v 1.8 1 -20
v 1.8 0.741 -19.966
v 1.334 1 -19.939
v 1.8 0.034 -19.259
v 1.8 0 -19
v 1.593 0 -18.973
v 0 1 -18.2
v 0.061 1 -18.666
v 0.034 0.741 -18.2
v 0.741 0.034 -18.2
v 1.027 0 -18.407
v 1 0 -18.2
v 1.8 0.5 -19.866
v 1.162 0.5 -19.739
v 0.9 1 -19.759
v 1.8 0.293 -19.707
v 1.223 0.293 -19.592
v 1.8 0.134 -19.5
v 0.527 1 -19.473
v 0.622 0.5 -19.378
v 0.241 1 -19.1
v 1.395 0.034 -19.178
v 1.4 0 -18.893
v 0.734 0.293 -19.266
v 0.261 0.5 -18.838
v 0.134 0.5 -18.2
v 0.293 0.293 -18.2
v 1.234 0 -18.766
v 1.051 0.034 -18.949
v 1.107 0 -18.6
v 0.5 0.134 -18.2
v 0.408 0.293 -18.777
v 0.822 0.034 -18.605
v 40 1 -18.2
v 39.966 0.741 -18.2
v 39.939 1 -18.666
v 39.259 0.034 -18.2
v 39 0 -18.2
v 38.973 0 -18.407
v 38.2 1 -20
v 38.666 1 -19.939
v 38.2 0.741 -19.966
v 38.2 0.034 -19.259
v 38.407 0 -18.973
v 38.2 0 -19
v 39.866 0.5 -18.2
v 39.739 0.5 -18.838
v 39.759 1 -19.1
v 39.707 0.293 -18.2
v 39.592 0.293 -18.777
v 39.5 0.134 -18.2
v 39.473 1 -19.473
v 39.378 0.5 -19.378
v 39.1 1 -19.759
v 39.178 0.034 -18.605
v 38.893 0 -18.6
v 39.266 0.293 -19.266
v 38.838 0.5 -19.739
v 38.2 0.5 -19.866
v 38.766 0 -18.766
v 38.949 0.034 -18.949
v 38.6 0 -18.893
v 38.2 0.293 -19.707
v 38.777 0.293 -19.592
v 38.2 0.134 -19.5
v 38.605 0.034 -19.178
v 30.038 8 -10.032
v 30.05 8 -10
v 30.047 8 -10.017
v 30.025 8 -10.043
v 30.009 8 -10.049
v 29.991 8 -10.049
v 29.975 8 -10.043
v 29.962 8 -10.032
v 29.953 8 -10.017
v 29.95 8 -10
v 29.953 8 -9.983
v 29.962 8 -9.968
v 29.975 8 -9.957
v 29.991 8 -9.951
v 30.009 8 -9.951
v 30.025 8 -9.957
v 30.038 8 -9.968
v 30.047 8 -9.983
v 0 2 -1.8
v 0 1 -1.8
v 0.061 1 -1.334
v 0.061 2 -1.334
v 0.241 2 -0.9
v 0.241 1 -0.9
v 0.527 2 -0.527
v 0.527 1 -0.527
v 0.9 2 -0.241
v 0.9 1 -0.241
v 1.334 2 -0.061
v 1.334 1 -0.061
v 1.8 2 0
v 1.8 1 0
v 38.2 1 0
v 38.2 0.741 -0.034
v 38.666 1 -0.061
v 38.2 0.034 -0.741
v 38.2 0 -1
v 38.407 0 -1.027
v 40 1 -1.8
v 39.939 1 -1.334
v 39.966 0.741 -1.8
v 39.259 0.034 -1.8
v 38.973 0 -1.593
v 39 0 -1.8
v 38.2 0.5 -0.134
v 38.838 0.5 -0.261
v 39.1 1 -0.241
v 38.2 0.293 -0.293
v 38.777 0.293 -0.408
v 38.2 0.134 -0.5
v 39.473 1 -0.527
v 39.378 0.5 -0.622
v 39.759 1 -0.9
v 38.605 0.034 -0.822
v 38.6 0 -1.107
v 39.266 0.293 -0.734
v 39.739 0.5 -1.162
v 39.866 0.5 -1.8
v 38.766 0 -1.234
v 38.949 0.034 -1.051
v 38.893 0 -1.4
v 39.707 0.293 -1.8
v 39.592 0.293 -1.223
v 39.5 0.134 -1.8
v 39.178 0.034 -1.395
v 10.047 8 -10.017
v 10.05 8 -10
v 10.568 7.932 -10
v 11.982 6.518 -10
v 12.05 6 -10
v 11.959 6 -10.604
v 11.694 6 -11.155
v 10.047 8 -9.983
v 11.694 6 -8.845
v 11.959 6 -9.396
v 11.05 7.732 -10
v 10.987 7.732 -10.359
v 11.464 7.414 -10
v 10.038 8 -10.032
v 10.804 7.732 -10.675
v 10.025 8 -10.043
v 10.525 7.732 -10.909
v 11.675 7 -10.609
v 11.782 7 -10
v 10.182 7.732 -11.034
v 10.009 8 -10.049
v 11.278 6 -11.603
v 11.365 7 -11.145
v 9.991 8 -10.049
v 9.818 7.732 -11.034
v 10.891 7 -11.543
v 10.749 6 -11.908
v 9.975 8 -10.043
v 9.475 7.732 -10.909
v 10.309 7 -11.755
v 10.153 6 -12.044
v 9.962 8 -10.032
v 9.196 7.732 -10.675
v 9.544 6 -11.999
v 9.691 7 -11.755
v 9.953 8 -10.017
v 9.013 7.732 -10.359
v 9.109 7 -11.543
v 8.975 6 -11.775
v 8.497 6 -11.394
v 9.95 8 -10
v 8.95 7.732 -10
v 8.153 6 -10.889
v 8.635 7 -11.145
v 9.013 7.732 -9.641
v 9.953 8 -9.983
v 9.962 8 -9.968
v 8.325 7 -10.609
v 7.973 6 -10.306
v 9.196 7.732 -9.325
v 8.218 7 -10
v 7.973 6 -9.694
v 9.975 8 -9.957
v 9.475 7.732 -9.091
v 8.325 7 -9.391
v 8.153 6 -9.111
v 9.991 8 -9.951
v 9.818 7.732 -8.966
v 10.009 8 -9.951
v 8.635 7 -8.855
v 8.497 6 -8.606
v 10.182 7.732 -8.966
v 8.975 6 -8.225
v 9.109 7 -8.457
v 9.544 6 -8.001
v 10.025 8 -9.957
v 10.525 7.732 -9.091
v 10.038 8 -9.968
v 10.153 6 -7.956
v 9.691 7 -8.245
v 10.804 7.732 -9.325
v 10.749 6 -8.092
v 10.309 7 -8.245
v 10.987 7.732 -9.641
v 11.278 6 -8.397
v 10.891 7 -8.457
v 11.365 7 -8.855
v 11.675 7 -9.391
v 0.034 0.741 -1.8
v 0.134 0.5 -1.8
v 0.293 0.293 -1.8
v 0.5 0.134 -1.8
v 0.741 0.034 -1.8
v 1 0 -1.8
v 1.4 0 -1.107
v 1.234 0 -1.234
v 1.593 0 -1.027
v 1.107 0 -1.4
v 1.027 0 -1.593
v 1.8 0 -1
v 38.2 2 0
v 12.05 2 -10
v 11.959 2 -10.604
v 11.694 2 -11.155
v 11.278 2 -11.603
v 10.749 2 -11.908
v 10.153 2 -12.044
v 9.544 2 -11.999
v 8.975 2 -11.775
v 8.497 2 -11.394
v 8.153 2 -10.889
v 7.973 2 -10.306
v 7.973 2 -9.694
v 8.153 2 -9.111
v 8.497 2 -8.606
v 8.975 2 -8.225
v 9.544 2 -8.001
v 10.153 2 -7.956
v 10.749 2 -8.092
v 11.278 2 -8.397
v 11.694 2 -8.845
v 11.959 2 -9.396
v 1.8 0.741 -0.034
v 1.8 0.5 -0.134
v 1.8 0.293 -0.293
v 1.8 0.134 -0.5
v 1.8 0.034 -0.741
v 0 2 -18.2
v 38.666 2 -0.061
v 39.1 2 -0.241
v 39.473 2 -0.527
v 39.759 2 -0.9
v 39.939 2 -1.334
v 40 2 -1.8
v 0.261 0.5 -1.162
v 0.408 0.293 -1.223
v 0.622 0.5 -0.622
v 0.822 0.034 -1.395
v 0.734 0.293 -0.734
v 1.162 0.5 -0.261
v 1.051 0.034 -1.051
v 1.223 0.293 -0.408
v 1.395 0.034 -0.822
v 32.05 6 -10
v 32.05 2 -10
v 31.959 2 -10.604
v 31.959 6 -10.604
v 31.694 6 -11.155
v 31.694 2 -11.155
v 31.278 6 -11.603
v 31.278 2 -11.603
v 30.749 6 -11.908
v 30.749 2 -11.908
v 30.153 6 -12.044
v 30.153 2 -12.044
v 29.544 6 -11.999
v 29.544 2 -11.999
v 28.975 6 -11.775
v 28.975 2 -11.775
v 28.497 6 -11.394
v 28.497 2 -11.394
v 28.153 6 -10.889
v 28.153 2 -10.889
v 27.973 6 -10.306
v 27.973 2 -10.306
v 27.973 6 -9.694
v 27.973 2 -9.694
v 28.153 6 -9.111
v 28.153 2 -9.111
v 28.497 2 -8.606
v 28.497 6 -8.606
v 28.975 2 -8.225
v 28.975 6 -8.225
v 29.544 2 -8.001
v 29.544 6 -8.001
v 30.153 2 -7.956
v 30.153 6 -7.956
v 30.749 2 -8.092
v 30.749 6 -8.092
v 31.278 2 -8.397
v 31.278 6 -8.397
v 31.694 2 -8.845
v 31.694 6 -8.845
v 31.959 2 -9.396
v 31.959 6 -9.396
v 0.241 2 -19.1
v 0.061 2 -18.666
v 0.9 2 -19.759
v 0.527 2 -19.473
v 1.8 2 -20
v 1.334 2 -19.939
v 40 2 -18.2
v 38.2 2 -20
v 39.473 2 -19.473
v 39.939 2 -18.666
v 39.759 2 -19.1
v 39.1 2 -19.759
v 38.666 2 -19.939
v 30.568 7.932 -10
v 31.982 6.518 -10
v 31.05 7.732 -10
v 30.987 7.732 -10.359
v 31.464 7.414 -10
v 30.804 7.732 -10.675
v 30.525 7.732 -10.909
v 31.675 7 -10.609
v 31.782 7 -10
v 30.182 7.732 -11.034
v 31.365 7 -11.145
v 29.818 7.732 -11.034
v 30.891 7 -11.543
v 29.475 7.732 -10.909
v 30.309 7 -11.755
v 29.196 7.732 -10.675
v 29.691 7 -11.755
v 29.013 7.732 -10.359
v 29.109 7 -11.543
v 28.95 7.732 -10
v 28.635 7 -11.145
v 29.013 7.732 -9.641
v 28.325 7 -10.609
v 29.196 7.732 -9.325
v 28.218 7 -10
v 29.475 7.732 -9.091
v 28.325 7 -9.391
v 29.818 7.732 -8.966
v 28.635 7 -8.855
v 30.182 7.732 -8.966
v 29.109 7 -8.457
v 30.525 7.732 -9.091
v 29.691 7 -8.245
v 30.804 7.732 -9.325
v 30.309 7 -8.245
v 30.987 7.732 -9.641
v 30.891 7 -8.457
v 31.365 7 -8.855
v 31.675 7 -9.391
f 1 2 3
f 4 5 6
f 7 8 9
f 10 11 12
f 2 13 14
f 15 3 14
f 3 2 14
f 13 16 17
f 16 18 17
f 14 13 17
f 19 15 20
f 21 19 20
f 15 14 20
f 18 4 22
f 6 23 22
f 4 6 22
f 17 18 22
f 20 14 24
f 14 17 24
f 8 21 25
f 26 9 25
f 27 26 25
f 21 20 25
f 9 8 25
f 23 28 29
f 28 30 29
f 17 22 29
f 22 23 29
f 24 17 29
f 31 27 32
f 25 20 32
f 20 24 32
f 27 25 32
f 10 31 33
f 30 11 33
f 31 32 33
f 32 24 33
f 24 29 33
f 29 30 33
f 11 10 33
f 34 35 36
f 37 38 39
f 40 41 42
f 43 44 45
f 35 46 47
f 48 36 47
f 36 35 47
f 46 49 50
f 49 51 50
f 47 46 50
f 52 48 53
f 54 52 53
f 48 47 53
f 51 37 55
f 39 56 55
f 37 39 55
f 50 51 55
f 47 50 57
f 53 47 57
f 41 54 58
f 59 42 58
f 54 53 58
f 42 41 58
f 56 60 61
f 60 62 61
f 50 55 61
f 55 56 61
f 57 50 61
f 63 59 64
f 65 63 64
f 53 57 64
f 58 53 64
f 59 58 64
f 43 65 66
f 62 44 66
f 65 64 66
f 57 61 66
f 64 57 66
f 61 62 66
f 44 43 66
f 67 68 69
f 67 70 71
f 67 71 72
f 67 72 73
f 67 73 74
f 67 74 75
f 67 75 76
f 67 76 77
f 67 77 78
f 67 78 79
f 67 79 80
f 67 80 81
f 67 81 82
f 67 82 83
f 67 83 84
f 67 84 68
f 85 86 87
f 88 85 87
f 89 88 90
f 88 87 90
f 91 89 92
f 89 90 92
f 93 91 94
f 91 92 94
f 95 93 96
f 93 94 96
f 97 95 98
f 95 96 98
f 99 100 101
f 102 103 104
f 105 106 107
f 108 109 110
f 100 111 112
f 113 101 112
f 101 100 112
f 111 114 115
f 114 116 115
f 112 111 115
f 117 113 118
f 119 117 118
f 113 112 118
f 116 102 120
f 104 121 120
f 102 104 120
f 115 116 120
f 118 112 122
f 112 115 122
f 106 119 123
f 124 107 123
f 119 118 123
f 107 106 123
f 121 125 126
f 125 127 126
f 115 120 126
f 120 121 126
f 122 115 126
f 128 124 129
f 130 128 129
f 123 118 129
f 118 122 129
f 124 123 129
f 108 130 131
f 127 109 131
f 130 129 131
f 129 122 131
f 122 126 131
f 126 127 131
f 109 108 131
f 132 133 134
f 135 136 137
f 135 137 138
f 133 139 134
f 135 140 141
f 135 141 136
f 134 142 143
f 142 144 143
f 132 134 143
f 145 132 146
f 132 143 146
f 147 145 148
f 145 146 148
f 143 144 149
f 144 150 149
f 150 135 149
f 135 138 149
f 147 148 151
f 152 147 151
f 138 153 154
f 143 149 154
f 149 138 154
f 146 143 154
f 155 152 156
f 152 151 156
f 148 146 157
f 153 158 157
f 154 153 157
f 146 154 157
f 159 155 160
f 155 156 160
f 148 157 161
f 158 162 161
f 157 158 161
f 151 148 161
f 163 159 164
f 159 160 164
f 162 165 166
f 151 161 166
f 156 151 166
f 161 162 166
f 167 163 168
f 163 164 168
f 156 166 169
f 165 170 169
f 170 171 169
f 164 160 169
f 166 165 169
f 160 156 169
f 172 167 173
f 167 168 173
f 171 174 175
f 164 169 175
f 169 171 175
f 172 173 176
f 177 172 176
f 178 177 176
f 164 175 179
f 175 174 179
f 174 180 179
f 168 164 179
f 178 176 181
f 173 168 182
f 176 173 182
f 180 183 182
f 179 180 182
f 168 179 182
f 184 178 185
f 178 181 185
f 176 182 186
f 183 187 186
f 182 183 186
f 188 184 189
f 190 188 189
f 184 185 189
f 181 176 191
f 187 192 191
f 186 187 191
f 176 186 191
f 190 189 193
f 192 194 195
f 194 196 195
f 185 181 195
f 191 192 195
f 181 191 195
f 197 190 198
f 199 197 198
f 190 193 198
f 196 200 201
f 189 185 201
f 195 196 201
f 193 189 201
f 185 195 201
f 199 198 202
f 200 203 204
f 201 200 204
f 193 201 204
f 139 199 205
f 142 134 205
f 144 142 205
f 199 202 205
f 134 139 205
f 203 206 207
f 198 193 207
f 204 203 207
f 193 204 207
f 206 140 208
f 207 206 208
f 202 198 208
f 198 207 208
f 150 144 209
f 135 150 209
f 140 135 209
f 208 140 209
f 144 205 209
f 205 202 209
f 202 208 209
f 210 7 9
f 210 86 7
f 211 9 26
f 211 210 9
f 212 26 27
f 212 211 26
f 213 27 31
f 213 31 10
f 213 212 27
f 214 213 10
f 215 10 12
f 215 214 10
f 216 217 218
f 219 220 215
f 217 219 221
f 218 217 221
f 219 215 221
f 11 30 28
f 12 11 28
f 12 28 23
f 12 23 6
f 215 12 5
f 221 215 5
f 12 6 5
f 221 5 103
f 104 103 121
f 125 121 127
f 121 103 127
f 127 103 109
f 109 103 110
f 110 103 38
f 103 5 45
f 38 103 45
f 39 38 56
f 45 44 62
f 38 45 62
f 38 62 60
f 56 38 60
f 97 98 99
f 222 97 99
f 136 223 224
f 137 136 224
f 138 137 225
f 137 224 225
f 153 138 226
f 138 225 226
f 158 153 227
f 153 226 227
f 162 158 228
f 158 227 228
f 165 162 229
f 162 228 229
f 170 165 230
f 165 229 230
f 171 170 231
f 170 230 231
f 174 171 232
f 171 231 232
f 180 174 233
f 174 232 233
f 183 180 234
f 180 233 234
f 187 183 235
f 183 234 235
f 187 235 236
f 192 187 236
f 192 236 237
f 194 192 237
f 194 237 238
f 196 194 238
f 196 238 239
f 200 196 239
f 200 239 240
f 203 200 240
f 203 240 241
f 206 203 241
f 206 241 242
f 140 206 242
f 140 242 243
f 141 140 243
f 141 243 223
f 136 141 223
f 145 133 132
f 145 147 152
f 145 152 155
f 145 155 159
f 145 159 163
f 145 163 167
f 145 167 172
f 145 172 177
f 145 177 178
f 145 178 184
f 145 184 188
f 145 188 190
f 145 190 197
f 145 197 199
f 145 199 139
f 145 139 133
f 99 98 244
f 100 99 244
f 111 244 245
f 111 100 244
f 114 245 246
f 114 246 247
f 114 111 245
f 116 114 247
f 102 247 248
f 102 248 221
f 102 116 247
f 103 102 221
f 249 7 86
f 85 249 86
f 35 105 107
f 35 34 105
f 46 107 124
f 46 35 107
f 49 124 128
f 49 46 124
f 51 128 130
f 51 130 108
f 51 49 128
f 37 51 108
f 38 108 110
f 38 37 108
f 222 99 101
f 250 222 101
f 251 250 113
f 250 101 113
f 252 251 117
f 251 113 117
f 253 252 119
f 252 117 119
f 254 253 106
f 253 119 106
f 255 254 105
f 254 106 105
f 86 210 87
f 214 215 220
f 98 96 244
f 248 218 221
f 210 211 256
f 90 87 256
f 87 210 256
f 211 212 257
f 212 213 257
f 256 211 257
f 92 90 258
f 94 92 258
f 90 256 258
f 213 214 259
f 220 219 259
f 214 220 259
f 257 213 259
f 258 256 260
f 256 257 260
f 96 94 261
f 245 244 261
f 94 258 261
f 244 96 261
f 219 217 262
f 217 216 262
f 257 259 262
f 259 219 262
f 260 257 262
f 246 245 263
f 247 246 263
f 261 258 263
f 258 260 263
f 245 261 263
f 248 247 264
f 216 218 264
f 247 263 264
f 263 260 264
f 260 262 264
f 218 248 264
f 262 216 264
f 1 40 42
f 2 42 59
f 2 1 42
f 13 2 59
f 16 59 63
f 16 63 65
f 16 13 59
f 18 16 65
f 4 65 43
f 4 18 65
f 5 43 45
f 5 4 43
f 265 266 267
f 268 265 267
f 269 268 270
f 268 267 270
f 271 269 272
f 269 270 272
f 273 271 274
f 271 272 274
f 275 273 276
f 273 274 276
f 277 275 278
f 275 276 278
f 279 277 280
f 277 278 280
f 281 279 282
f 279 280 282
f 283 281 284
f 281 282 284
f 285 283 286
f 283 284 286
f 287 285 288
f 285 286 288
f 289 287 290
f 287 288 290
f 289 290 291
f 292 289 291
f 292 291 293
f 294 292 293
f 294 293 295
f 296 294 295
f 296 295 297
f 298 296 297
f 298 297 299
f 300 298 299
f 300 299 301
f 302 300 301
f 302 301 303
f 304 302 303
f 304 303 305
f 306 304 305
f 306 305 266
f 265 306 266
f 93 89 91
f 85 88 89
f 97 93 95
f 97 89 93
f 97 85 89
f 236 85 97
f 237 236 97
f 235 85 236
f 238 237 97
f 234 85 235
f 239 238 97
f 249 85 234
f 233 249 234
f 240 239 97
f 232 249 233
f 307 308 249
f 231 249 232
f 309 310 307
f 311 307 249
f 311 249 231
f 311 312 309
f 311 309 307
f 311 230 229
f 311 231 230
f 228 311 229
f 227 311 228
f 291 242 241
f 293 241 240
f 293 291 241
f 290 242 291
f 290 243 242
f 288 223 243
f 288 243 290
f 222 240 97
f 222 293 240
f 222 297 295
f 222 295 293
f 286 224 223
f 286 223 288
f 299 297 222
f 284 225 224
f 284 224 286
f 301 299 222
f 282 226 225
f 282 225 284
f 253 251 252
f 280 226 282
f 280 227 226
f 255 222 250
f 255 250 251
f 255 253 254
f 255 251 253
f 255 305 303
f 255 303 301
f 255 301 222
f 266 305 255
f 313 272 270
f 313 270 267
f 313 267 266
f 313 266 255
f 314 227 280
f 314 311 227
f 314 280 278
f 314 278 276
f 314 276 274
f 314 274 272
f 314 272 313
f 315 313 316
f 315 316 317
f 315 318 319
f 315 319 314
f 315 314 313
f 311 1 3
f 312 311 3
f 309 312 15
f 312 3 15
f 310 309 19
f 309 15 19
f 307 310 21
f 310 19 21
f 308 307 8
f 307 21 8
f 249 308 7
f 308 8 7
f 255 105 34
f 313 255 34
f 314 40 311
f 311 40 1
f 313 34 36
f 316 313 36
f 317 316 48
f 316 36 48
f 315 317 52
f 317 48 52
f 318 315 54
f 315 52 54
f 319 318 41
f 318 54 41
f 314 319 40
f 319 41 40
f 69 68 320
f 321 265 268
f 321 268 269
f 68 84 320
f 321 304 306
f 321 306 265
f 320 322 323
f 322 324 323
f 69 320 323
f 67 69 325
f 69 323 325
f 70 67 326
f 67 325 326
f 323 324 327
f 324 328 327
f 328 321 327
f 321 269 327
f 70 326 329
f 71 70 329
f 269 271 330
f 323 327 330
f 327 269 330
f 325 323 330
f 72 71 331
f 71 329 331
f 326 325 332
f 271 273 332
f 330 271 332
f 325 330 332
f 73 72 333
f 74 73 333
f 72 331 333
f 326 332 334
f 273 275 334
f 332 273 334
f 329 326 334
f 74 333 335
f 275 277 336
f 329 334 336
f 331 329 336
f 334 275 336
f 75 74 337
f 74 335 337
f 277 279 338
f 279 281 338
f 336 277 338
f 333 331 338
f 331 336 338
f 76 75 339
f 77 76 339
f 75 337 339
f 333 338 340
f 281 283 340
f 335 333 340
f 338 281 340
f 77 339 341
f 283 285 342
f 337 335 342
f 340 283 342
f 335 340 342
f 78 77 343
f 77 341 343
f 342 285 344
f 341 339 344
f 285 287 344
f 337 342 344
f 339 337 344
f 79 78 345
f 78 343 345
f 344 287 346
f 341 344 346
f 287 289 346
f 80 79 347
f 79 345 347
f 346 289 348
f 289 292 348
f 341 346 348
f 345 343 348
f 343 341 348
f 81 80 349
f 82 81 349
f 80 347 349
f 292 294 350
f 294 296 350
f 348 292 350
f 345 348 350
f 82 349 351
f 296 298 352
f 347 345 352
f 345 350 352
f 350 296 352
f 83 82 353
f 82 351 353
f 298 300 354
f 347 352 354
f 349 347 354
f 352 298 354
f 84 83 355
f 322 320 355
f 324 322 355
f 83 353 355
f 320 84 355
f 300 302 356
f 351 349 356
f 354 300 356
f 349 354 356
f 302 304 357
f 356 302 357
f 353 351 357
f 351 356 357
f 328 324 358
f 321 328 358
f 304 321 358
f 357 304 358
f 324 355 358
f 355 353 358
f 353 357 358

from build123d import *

# Parameters (mm, degrees)
SKETCH1_R           = 2.05
BOSS_EXTRUDE1_DEPTH = 2
SKETCH1_2_R         = 2.05
BOSS_EXTRUDE2_DEPTH = 8
FILLET1_R           = 2
FILLET2_R           = 1


with BuildPart() as part:
    # Sketch1 → Boss-Extrude1 (new body)
    with BuildSketch(Plane(origin=(0, 0, 0), x_dir=(1, 0, 0), z_dir=(0, 1, 0))):
        with BuildLine():
            Line((1.8, 0), (38.2, 0))
            ThreePointArc((38.2, 0), (39.472792206, 0.527207794), (40, 1.8))
            Line((40, 1.8), (40, 18.2))
            ThreePointArc((40, 18.2), (39.472792206, 19.472792206), (38.2, 20))
            Line((38.2, 20), (1.8, 20))
            ThreePointArc((1.8, 20), (0.527207794, 19.472792206), (0, 18.2))
            Line((0, 18.2), (0, 1.8))
            ThreePointArc((0, 1.8), (0.527207794, 0.527207794), (1.8, 0))
        make_face()
        with Locations((10, 10)):
            Circle(SKETCH1_R, mode=Mode.SUBTRACT)
        with Locations((30, 10)):
            Circle(SKETCH1_R, mode=Mode.SUBTRACT)
    extrude(amount=BOSS_EXTRUDE1_DEPTH)

    # Sketch1<2> → Boss-Extrude2 (add)
    with BuildSketch(Plane(origin=(0, 0, 0), x_dir=(1, 0, 0), z_dir=(0, 1, 0))):
        with Locations((30, 10)):
            Circle(SKETCH1_2_R)
        with Locations((10, 10)):
            Circle(SKETCH1_2_R)
    extrude(amount=BOSS_EXTRUDE2_DEPTH)

    # Fillet1
    fillet1_edges = [part.edges().sort_by_distance(p)[0] for p in [
        (7.95, 8, -10),
        (27.95, 8, -10),
    ]]
    fillet(fillet1_edges, radius=FILLET1_R)

    # Fillet2
    fillet2_edges = [part.edges().sort_by_distance(p)[0] for p in [
        (20, 0, 0),
        (39.472792206, 0, -0.527207794),
        (40, 0, -10),
        (39.472792206, 0, -19.472792206),
        (20, 0, -20),
        (0.527207794, 0, -19.472792206),
        (0, 0, -10),
        (0.527207794, 0, -0.527207794),
    ]]
    fillet(fillet2_edges, radius=FILLET2_R)


solid = part.part
